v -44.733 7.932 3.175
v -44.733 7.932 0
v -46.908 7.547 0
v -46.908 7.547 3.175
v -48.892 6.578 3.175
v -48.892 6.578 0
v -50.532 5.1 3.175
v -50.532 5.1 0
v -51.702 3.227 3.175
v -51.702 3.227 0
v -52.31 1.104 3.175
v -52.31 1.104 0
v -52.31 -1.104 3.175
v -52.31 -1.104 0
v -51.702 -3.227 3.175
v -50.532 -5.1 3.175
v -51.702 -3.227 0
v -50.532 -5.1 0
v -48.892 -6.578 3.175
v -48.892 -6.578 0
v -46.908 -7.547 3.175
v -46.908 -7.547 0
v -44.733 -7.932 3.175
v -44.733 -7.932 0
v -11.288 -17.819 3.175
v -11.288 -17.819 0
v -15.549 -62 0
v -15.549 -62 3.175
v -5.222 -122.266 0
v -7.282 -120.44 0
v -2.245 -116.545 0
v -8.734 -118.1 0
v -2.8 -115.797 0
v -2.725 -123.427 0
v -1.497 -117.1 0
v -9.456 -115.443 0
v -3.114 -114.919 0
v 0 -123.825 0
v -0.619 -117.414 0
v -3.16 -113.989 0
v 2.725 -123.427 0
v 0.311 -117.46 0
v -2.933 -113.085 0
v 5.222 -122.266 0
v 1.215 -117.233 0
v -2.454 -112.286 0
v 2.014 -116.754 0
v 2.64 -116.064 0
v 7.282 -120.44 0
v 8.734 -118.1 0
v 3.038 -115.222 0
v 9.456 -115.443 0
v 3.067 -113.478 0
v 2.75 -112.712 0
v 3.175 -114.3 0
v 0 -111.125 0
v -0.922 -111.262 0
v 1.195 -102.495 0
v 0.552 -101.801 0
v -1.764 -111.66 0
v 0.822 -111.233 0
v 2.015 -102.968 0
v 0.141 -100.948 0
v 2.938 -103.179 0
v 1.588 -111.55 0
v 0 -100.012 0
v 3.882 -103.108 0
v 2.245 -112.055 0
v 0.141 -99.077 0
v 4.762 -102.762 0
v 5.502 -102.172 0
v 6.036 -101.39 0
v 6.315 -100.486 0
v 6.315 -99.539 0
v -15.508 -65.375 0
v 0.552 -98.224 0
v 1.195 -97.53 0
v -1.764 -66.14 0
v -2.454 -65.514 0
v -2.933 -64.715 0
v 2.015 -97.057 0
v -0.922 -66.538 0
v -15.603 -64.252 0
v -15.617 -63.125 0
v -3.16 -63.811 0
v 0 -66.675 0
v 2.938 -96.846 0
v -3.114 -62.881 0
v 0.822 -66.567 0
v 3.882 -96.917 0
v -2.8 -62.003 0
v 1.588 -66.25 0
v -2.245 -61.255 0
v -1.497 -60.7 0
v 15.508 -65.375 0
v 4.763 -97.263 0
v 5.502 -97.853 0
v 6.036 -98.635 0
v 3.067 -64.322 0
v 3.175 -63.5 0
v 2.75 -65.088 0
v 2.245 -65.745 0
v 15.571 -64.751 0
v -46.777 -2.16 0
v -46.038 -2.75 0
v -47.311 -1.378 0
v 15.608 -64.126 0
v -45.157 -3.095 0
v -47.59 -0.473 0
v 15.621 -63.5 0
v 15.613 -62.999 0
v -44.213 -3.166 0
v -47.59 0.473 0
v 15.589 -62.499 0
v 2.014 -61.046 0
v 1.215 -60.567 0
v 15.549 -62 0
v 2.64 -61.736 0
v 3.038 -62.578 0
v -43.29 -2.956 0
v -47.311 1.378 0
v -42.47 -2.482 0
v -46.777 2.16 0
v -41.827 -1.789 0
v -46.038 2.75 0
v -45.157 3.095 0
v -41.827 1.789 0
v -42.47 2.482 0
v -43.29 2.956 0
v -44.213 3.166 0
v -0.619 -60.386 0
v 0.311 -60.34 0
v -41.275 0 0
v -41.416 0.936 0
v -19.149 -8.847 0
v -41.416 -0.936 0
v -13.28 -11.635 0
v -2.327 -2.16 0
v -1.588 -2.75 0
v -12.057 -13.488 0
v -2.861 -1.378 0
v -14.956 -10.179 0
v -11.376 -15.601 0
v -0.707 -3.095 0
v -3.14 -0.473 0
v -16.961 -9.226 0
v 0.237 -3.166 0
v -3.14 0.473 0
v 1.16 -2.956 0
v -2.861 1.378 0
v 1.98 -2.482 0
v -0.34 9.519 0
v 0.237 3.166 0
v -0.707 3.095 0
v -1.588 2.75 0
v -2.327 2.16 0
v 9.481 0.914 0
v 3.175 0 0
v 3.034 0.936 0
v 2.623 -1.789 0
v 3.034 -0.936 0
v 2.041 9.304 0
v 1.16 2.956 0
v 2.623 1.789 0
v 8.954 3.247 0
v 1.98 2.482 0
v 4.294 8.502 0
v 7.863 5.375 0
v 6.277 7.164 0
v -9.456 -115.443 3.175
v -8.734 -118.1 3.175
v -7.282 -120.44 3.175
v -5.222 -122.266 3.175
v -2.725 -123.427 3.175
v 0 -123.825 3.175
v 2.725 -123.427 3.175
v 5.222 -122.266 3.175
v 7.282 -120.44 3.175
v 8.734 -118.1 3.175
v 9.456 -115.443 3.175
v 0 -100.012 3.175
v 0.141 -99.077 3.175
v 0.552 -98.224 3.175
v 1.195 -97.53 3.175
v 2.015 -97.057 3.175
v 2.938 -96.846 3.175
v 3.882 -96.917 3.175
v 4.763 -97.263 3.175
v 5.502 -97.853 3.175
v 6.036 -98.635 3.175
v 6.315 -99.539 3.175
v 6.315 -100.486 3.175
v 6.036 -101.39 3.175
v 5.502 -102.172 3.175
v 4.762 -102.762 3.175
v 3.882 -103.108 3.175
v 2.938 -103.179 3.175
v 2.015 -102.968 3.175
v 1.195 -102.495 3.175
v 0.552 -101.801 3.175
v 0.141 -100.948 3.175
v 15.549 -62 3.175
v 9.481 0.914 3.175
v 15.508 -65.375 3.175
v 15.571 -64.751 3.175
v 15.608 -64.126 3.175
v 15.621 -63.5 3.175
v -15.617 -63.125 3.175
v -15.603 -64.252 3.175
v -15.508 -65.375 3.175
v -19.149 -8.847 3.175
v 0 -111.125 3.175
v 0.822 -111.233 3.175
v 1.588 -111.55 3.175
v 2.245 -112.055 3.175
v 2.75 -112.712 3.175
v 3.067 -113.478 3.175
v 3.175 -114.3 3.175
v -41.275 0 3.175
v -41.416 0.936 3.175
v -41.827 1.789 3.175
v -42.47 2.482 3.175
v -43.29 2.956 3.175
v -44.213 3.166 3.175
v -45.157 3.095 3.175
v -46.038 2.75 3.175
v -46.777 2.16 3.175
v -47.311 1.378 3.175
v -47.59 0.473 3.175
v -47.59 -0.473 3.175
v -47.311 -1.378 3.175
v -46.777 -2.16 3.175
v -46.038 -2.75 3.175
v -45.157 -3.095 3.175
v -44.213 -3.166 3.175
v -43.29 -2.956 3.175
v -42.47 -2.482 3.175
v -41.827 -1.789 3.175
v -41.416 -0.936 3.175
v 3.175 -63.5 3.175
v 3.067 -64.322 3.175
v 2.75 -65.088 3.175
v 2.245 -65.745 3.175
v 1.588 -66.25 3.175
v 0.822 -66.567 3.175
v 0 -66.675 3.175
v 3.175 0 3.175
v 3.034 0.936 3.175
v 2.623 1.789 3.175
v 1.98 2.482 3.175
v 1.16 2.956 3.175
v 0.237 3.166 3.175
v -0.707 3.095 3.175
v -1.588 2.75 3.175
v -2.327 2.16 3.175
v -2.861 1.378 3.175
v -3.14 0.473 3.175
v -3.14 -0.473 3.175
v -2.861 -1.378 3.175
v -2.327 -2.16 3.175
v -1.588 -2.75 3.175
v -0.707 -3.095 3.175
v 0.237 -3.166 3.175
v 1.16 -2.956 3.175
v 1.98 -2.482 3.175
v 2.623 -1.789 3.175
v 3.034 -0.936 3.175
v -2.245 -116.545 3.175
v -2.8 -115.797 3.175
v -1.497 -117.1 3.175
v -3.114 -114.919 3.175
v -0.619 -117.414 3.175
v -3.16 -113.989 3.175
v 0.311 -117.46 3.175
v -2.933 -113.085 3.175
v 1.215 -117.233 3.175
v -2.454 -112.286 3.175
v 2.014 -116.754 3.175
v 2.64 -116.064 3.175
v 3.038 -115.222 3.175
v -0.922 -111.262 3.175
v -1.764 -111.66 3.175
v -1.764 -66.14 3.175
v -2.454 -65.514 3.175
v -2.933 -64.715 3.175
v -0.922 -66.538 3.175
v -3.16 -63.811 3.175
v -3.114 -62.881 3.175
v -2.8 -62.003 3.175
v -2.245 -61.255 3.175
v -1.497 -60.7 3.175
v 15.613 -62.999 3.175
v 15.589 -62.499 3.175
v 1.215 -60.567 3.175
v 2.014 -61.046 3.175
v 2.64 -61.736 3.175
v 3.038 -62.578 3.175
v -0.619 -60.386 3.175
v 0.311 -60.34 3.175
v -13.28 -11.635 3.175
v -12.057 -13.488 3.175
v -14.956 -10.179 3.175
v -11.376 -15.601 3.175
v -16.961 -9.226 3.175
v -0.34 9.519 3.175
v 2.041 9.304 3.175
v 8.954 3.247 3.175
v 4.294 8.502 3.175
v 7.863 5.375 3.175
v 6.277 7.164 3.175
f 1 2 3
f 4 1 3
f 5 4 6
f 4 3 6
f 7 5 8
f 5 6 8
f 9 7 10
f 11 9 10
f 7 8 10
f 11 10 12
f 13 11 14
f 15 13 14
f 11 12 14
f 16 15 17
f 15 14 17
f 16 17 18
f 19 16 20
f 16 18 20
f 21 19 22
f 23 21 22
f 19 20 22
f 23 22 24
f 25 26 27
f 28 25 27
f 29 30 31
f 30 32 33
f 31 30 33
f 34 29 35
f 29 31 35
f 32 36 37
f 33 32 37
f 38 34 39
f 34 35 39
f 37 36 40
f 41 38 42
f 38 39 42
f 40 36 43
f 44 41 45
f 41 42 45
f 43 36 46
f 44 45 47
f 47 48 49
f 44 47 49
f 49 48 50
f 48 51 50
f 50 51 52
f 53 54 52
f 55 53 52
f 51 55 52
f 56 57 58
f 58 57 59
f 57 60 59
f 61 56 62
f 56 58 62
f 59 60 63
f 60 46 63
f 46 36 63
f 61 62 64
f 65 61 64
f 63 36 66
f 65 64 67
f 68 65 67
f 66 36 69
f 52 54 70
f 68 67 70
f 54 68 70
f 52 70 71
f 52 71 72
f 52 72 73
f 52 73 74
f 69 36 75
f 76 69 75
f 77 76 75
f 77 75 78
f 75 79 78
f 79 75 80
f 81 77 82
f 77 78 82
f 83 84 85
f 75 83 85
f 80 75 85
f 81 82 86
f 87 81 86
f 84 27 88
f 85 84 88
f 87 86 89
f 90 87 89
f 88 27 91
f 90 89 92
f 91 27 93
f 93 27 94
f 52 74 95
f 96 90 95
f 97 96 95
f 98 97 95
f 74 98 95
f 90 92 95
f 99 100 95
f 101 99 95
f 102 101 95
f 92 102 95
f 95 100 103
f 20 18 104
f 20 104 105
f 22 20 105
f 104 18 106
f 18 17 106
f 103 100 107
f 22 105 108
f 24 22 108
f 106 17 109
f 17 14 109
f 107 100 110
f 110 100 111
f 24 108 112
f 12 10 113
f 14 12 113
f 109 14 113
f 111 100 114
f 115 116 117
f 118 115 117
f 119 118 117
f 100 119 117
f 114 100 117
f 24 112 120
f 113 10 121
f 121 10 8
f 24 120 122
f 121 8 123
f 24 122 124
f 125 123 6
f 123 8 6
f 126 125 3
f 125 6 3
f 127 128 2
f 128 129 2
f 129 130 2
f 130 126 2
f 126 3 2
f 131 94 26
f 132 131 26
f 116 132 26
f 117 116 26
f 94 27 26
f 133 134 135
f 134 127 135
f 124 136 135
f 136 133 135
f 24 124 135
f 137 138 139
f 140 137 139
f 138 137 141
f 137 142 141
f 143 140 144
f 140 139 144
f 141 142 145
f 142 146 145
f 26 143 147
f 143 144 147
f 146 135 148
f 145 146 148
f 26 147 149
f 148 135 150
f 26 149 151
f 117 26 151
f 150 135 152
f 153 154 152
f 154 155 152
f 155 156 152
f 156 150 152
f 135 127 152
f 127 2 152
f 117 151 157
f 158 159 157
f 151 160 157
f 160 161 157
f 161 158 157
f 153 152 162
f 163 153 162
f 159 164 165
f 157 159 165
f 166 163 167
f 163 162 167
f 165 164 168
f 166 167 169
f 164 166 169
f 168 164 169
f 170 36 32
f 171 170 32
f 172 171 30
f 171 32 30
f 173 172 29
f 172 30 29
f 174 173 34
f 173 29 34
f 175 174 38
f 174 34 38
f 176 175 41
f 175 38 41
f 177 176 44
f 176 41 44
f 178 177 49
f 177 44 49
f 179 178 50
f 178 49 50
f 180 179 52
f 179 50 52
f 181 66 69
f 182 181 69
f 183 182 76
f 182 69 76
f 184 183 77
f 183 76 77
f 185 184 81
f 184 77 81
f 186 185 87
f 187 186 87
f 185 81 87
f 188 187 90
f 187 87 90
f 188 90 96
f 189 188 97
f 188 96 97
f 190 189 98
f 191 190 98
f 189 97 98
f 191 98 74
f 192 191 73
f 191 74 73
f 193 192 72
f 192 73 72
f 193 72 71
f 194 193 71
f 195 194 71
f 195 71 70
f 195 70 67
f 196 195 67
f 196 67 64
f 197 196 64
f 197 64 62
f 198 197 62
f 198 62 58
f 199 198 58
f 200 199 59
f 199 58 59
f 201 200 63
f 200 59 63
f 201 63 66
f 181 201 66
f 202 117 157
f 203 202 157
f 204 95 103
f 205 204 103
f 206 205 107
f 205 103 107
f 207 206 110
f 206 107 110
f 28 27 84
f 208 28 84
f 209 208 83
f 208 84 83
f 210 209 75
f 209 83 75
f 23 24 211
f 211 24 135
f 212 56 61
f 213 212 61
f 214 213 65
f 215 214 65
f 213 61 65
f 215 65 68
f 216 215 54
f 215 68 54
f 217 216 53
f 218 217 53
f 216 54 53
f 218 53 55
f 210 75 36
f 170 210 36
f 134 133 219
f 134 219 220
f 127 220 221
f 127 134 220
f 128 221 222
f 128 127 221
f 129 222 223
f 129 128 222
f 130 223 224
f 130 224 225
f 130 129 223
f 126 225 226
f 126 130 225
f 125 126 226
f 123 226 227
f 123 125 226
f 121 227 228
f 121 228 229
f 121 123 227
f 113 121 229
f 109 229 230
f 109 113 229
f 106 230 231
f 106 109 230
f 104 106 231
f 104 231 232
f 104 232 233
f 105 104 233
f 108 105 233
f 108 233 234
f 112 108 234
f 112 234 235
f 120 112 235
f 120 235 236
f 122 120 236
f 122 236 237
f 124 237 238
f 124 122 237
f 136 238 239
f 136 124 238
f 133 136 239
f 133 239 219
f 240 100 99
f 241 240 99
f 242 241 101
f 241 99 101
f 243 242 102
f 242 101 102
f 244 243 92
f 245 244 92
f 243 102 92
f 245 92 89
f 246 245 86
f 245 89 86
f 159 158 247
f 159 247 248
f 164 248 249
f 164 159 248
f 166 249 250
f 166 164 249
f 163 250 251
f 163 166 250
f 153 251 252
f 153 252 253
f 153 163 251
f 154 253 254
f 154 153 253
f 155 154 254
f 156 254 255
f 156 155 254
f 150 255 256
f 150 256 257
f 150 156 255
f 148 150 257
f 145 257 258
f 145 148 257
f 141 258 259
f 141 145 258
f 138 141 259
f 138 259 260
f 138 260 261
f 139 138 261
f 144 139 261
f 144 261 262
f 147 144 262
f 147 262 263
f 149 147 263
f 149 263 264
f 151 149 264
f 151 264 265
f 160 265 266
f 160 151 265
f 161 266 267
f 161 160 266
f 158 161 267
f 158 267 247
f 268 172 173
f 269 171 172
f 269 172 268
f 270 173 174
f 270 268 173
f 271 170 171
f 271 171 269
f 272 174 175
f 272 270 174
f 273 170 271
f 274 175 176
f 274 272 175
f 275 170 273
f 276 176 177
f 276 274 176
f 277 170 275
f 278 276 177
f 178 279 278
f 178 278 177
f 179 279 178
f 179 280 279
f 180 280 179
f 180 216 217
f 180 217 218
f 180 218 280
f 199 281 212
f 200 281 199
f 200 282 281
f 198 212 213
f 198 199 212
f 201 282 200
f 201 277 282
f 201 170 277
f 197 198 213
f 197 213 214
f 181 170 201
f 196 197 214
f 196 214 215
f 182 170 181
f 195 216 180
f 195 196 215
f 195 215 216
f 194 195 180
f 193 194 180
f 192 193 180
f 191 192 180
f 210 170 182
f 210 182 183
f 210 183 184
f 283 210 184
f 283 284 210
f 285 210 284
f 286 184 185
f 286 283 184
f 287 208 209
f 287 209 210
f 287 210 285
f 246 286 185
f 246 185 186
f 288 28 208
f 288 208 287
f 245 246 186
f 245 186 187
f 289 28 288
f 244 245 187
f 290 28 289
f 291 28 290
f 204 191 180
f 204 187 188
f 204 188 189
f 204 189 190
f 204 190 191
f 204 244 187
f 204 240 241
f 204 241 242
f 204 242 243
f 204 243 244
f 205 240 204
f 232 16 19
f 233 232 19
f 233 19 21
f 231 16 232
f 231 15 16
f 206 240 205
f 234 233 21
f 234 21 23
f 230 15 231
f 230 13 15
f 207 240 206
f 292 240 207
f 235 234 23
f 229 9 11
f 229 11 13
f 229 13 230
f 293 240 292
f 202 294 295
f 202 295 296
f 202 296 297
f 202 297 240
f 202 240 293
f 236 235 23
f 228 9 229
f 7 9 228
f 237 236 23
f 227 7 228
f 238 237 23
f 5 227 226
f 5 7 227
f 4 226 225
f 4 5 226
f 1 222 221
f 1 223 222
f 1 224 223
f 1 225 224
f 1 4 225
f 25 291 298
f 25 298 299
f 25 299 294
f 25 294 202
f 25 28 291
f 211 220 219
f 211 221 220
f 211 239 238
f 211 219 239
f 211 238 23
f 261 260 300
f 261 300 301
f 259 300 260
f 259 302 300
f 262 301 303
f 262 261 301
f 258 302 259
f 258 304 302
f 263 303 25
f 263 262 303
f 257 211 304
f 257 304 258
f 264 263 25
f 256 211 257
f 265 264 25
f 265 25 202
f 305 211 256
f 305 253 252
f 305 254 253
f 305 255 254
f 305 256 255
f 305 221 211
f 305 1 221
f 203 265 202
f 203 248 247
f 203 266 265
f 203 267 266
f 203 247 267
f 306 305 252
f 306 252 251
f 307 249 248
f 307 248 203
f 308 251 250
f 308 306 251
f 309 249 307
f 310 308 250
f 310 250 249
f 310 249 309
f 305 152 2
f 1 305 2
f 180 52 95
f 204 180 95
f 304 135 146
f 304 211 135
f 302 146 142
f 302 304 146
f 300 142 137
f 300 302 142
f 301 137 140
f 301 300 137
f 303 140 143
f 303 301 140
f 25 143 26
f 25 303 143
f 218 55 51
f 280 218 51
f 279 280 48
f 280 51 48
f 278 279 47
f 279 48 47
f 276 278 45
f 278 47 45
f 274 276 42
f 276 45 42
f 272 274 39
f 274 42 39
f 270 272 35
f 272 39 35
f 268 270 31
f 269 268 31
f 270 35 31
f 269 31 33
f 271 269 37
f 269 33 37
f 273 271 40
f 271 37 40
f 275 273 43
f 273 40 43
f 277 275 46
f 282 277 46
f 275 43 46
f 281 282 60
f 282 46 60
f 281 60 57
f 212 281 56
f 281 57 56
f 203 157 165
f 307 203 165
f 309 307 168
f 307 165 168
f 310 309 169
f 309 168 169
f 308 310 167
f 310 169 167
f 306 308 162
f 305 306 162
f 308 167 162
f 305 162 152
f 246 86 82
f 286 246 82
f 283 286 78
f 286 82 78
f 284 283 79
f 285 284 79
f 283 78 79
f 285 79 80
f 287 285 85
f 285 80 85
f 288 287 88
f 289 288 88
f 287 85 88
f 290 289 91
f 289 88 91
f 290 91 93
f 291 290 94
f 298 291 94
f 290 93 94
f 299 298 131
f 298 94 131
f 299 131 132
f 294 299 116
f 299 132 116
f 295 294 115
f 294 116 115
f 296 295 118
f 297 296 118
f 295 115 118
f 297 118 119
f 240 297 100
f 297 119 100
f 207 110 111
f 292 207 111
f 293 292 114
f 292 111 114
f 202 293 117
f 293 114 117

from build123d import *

# Parameters (mm, degrees)
F0_R     = 3.175
F1_DEPTH = 3.175
F2_R     = 8.1915


with BuildPart() as f1:
    # F0 (on Top) → F1 (new body)
    with BuildSketch(Plane.XY):
        with BuildLine():
            ThreePointArc((-15.5081209619, -65.37452), (-10.36179917, -75.1896860078), (0, -79.121))
            ThreePointArc((0, -79.121), (10.36179917, -75.1896860078), (15.5081209619, -65.37452))
            ThreePointArc((15.5081209619, -65.37452), (15.5927547044, -64.4389577876), (15.621, -63.5))
            ThreePointArc((15.621, -63.5), (15.602952529, -62.7493247194), (15.5488518178, -62.000384))
            ThreePointArc((15.5488518178, -62.000384), (0, -47.879), (-15.5488518178, -62.000384))
            ThreePointArc((-15.5488518178, -62.000384), (-15.6198619711, -63.6885550396), (-15.5081209619, -65.37452))
        make_face()
        with BuildLine():
            ThreePointArc((0, -66.675), (-2.2450640303, -61.2549359697), (3.175, -63.5))
            ThreePointArc((3.175, -63.5), (2.2450640303, -65.7450640303), (0, -66.675))
        make_face(mode=Mode.SUBTRACT)
        with BuildLine():
            ThreePointArc((15.5081209619, -65.37452), (10.36179917, -75.1896860078), (0, -79.121))
            Line((0, -79.121), (0, -100.0125))
            Line((0, -100.0125), (0, -104.775))
            ThreePointArc((0, -104.775), (6.7351920908, -107.5648079092), (9.525, -114.3))
            ThreePointArc((9.525, -114.3), (9.5077772588, -114.8725352363), (9.4561713182, -115.443))
            Line((9.4561713182, -115.443), (15.5081209619, -65.37452))
        make_face()
        with BuildLine():
            ThreePointArc((6.35, -100.0125), (3.175, -103.1875), (0, -100.0125))
            ThreePointArc((0, -100.0125), (3.175, -96.8375), (6.35, -100.0125))
        make_face(mode=Mode.SUBTRACT)
        with BuildLine():
            Line((0, -100.0125), (0, -79.121))
            ThreePointArc((0, -79.121), (-10.36179917, -75.1896860078), (-15.5081209619, -65.37452))
            Line((-15.5081209619, -65.37452), (-9.4561713182, -115.443))
            ThreePointArc((-9.4561713182, -115.443), (-7.1278573218, -107.9818297744), (0, -104.775))
            Line((0, -104.775), (0, -100.0125))
        make_face()
        with BuildLine():
            ThreePointArc((9.525, -114.3), (6.7351920908, -107.5648079092), (0, -104.775))
            ThreePointArc((0, -104.775), (-7.1278573218, -107.9818297744), (-9.4561713182, -115.443))
            ThreePointArc((-9.4561713182, -115.443), (0, -123.825), (9.4561713182, -115.443))
            ThreePointArc((9.4561713182, -115.443), (9.5077772588, -114.8725352363), (9.525, -114.3))
        make_face()
        with BuildLine():
            ThreePointArc((3.175, -114.3), (-2.2450640303, -116.5450640303), (0, -111.125))
            ThreePointArc((0, -111.125), (2.2450640303, -112.0549359697), (3.175, -114.3))
        make_face(mode=Mode.SUBTRACT)
        with BuildLine():
            Line((-10.4524001899, -9.157542126), (-15.5488518178, -62.000384))
            ThreePointArc((-15.5488518178, -62.000384), (0, -47.879), (15.5488518178, -62.000384))
            Line((15.5488518178, -62.000384), (9.481007206, 0.9144))
            ThreePointArc((9.481007206, 0.9144), (9.5139954445, 0.4577288296), (9.525, 0))
            ThreePointArc((9.525, 0), (6.6138273175, -6.8544083052), (-0.3401786278, -9.5189234423))
            Line((-0.3401786278, -9.5189234423), (-10.4524001899, -9.157542126))
        make_face()
        with BuildLine():
            Line((-9.481007206, 0.9144), (-10.4524001899, -9.157542126))
            Line((-10.4524001899, -9.157542126), (-0.3401786278, -9.5189234423))
            ThreePointArc((-0.3401786278, -9.5189234423), (-7.164320087, -6.2767939819), (-9.481007206, 0.9144))
        make_face()
        with BuildLine():
            Line((-44.7334821429, -7.9324362036), (-10.4524001899, -9.157542126))
            Line((-10.4524001899, -9.157542126), (-9.481007206, 0.9144))
            ThreePointArc((-9.481007206, 0.9144), (-6.5286581491, 6.9355784022), (-0.3401783155, 9.5189234535))
            Line((-0.3401783155, 9.5189234535), (-44.7334821429, 7.9324362036))
            ThreePointArc((-44.7334821429, 7.9324362036), (-38.9384772185, 5.7120069047), (-36.5125, 0))
            ThreePointArc((-36.5125, 0), (-38.9384772185, -5.7120069047), (-44.7334821429, -7.9324362036))
        make_face()
        with BuildLine():
            ThreePointArc((9.525, 0), (9.5139954445, 0.4577288296), (9.481007206, 0.9144))
            ThreePointArc((9.481007206, 0.9144), (6.2767940994, 7.164319984), (-0.3401783155, 9.5189234535))
            ThreePointArc((-0.3401783155, 9.5189234535), (-6.5286581491, 6.9355784022), (-9.481007206, 0.9144))
            ThreePointArc((-9.481007206, 0.9144), (-7.164320087, -6.2767939819), (-0.3401786278, -9.5189234423))
            ThreePointArc((-0.3401786278, -9.5189234423), (6.6138273175, -6.8544083052), (9.525, 0))
        make_face()
        Circle(F0_R, mode=Mode.SUBTRACT)
        with BuildLine():
            ThreePointArc((-44.7334821429, 7.9324362036), (-52.3875, 0), (-44.7334821429, -7.9324362036))
            ThreePointArc((-44.7334821429, -7.9324362036), (-38.9384772185, -5.7120069047), (-36.5125, 0))
            ThreePointArc((-36.5125, 0), (-38.9384772185, 5.7120069047), (-44.7334821429, 7.9324362036))
        make_face()
        with Locations((-44.45, 0)):
            Circle(F0_R, mode=Mode.SUBTRACT)
    extrude(amount=F1_DEPTH)

    # F2
    f2_edges = [f1.edges().sort_by_distance(p)[0] for p in [
        (-10.4524, -9.157542, 1.5875),
    ]]
    fillet(f2_edges, radius=F2_R)


solid = f1.part
